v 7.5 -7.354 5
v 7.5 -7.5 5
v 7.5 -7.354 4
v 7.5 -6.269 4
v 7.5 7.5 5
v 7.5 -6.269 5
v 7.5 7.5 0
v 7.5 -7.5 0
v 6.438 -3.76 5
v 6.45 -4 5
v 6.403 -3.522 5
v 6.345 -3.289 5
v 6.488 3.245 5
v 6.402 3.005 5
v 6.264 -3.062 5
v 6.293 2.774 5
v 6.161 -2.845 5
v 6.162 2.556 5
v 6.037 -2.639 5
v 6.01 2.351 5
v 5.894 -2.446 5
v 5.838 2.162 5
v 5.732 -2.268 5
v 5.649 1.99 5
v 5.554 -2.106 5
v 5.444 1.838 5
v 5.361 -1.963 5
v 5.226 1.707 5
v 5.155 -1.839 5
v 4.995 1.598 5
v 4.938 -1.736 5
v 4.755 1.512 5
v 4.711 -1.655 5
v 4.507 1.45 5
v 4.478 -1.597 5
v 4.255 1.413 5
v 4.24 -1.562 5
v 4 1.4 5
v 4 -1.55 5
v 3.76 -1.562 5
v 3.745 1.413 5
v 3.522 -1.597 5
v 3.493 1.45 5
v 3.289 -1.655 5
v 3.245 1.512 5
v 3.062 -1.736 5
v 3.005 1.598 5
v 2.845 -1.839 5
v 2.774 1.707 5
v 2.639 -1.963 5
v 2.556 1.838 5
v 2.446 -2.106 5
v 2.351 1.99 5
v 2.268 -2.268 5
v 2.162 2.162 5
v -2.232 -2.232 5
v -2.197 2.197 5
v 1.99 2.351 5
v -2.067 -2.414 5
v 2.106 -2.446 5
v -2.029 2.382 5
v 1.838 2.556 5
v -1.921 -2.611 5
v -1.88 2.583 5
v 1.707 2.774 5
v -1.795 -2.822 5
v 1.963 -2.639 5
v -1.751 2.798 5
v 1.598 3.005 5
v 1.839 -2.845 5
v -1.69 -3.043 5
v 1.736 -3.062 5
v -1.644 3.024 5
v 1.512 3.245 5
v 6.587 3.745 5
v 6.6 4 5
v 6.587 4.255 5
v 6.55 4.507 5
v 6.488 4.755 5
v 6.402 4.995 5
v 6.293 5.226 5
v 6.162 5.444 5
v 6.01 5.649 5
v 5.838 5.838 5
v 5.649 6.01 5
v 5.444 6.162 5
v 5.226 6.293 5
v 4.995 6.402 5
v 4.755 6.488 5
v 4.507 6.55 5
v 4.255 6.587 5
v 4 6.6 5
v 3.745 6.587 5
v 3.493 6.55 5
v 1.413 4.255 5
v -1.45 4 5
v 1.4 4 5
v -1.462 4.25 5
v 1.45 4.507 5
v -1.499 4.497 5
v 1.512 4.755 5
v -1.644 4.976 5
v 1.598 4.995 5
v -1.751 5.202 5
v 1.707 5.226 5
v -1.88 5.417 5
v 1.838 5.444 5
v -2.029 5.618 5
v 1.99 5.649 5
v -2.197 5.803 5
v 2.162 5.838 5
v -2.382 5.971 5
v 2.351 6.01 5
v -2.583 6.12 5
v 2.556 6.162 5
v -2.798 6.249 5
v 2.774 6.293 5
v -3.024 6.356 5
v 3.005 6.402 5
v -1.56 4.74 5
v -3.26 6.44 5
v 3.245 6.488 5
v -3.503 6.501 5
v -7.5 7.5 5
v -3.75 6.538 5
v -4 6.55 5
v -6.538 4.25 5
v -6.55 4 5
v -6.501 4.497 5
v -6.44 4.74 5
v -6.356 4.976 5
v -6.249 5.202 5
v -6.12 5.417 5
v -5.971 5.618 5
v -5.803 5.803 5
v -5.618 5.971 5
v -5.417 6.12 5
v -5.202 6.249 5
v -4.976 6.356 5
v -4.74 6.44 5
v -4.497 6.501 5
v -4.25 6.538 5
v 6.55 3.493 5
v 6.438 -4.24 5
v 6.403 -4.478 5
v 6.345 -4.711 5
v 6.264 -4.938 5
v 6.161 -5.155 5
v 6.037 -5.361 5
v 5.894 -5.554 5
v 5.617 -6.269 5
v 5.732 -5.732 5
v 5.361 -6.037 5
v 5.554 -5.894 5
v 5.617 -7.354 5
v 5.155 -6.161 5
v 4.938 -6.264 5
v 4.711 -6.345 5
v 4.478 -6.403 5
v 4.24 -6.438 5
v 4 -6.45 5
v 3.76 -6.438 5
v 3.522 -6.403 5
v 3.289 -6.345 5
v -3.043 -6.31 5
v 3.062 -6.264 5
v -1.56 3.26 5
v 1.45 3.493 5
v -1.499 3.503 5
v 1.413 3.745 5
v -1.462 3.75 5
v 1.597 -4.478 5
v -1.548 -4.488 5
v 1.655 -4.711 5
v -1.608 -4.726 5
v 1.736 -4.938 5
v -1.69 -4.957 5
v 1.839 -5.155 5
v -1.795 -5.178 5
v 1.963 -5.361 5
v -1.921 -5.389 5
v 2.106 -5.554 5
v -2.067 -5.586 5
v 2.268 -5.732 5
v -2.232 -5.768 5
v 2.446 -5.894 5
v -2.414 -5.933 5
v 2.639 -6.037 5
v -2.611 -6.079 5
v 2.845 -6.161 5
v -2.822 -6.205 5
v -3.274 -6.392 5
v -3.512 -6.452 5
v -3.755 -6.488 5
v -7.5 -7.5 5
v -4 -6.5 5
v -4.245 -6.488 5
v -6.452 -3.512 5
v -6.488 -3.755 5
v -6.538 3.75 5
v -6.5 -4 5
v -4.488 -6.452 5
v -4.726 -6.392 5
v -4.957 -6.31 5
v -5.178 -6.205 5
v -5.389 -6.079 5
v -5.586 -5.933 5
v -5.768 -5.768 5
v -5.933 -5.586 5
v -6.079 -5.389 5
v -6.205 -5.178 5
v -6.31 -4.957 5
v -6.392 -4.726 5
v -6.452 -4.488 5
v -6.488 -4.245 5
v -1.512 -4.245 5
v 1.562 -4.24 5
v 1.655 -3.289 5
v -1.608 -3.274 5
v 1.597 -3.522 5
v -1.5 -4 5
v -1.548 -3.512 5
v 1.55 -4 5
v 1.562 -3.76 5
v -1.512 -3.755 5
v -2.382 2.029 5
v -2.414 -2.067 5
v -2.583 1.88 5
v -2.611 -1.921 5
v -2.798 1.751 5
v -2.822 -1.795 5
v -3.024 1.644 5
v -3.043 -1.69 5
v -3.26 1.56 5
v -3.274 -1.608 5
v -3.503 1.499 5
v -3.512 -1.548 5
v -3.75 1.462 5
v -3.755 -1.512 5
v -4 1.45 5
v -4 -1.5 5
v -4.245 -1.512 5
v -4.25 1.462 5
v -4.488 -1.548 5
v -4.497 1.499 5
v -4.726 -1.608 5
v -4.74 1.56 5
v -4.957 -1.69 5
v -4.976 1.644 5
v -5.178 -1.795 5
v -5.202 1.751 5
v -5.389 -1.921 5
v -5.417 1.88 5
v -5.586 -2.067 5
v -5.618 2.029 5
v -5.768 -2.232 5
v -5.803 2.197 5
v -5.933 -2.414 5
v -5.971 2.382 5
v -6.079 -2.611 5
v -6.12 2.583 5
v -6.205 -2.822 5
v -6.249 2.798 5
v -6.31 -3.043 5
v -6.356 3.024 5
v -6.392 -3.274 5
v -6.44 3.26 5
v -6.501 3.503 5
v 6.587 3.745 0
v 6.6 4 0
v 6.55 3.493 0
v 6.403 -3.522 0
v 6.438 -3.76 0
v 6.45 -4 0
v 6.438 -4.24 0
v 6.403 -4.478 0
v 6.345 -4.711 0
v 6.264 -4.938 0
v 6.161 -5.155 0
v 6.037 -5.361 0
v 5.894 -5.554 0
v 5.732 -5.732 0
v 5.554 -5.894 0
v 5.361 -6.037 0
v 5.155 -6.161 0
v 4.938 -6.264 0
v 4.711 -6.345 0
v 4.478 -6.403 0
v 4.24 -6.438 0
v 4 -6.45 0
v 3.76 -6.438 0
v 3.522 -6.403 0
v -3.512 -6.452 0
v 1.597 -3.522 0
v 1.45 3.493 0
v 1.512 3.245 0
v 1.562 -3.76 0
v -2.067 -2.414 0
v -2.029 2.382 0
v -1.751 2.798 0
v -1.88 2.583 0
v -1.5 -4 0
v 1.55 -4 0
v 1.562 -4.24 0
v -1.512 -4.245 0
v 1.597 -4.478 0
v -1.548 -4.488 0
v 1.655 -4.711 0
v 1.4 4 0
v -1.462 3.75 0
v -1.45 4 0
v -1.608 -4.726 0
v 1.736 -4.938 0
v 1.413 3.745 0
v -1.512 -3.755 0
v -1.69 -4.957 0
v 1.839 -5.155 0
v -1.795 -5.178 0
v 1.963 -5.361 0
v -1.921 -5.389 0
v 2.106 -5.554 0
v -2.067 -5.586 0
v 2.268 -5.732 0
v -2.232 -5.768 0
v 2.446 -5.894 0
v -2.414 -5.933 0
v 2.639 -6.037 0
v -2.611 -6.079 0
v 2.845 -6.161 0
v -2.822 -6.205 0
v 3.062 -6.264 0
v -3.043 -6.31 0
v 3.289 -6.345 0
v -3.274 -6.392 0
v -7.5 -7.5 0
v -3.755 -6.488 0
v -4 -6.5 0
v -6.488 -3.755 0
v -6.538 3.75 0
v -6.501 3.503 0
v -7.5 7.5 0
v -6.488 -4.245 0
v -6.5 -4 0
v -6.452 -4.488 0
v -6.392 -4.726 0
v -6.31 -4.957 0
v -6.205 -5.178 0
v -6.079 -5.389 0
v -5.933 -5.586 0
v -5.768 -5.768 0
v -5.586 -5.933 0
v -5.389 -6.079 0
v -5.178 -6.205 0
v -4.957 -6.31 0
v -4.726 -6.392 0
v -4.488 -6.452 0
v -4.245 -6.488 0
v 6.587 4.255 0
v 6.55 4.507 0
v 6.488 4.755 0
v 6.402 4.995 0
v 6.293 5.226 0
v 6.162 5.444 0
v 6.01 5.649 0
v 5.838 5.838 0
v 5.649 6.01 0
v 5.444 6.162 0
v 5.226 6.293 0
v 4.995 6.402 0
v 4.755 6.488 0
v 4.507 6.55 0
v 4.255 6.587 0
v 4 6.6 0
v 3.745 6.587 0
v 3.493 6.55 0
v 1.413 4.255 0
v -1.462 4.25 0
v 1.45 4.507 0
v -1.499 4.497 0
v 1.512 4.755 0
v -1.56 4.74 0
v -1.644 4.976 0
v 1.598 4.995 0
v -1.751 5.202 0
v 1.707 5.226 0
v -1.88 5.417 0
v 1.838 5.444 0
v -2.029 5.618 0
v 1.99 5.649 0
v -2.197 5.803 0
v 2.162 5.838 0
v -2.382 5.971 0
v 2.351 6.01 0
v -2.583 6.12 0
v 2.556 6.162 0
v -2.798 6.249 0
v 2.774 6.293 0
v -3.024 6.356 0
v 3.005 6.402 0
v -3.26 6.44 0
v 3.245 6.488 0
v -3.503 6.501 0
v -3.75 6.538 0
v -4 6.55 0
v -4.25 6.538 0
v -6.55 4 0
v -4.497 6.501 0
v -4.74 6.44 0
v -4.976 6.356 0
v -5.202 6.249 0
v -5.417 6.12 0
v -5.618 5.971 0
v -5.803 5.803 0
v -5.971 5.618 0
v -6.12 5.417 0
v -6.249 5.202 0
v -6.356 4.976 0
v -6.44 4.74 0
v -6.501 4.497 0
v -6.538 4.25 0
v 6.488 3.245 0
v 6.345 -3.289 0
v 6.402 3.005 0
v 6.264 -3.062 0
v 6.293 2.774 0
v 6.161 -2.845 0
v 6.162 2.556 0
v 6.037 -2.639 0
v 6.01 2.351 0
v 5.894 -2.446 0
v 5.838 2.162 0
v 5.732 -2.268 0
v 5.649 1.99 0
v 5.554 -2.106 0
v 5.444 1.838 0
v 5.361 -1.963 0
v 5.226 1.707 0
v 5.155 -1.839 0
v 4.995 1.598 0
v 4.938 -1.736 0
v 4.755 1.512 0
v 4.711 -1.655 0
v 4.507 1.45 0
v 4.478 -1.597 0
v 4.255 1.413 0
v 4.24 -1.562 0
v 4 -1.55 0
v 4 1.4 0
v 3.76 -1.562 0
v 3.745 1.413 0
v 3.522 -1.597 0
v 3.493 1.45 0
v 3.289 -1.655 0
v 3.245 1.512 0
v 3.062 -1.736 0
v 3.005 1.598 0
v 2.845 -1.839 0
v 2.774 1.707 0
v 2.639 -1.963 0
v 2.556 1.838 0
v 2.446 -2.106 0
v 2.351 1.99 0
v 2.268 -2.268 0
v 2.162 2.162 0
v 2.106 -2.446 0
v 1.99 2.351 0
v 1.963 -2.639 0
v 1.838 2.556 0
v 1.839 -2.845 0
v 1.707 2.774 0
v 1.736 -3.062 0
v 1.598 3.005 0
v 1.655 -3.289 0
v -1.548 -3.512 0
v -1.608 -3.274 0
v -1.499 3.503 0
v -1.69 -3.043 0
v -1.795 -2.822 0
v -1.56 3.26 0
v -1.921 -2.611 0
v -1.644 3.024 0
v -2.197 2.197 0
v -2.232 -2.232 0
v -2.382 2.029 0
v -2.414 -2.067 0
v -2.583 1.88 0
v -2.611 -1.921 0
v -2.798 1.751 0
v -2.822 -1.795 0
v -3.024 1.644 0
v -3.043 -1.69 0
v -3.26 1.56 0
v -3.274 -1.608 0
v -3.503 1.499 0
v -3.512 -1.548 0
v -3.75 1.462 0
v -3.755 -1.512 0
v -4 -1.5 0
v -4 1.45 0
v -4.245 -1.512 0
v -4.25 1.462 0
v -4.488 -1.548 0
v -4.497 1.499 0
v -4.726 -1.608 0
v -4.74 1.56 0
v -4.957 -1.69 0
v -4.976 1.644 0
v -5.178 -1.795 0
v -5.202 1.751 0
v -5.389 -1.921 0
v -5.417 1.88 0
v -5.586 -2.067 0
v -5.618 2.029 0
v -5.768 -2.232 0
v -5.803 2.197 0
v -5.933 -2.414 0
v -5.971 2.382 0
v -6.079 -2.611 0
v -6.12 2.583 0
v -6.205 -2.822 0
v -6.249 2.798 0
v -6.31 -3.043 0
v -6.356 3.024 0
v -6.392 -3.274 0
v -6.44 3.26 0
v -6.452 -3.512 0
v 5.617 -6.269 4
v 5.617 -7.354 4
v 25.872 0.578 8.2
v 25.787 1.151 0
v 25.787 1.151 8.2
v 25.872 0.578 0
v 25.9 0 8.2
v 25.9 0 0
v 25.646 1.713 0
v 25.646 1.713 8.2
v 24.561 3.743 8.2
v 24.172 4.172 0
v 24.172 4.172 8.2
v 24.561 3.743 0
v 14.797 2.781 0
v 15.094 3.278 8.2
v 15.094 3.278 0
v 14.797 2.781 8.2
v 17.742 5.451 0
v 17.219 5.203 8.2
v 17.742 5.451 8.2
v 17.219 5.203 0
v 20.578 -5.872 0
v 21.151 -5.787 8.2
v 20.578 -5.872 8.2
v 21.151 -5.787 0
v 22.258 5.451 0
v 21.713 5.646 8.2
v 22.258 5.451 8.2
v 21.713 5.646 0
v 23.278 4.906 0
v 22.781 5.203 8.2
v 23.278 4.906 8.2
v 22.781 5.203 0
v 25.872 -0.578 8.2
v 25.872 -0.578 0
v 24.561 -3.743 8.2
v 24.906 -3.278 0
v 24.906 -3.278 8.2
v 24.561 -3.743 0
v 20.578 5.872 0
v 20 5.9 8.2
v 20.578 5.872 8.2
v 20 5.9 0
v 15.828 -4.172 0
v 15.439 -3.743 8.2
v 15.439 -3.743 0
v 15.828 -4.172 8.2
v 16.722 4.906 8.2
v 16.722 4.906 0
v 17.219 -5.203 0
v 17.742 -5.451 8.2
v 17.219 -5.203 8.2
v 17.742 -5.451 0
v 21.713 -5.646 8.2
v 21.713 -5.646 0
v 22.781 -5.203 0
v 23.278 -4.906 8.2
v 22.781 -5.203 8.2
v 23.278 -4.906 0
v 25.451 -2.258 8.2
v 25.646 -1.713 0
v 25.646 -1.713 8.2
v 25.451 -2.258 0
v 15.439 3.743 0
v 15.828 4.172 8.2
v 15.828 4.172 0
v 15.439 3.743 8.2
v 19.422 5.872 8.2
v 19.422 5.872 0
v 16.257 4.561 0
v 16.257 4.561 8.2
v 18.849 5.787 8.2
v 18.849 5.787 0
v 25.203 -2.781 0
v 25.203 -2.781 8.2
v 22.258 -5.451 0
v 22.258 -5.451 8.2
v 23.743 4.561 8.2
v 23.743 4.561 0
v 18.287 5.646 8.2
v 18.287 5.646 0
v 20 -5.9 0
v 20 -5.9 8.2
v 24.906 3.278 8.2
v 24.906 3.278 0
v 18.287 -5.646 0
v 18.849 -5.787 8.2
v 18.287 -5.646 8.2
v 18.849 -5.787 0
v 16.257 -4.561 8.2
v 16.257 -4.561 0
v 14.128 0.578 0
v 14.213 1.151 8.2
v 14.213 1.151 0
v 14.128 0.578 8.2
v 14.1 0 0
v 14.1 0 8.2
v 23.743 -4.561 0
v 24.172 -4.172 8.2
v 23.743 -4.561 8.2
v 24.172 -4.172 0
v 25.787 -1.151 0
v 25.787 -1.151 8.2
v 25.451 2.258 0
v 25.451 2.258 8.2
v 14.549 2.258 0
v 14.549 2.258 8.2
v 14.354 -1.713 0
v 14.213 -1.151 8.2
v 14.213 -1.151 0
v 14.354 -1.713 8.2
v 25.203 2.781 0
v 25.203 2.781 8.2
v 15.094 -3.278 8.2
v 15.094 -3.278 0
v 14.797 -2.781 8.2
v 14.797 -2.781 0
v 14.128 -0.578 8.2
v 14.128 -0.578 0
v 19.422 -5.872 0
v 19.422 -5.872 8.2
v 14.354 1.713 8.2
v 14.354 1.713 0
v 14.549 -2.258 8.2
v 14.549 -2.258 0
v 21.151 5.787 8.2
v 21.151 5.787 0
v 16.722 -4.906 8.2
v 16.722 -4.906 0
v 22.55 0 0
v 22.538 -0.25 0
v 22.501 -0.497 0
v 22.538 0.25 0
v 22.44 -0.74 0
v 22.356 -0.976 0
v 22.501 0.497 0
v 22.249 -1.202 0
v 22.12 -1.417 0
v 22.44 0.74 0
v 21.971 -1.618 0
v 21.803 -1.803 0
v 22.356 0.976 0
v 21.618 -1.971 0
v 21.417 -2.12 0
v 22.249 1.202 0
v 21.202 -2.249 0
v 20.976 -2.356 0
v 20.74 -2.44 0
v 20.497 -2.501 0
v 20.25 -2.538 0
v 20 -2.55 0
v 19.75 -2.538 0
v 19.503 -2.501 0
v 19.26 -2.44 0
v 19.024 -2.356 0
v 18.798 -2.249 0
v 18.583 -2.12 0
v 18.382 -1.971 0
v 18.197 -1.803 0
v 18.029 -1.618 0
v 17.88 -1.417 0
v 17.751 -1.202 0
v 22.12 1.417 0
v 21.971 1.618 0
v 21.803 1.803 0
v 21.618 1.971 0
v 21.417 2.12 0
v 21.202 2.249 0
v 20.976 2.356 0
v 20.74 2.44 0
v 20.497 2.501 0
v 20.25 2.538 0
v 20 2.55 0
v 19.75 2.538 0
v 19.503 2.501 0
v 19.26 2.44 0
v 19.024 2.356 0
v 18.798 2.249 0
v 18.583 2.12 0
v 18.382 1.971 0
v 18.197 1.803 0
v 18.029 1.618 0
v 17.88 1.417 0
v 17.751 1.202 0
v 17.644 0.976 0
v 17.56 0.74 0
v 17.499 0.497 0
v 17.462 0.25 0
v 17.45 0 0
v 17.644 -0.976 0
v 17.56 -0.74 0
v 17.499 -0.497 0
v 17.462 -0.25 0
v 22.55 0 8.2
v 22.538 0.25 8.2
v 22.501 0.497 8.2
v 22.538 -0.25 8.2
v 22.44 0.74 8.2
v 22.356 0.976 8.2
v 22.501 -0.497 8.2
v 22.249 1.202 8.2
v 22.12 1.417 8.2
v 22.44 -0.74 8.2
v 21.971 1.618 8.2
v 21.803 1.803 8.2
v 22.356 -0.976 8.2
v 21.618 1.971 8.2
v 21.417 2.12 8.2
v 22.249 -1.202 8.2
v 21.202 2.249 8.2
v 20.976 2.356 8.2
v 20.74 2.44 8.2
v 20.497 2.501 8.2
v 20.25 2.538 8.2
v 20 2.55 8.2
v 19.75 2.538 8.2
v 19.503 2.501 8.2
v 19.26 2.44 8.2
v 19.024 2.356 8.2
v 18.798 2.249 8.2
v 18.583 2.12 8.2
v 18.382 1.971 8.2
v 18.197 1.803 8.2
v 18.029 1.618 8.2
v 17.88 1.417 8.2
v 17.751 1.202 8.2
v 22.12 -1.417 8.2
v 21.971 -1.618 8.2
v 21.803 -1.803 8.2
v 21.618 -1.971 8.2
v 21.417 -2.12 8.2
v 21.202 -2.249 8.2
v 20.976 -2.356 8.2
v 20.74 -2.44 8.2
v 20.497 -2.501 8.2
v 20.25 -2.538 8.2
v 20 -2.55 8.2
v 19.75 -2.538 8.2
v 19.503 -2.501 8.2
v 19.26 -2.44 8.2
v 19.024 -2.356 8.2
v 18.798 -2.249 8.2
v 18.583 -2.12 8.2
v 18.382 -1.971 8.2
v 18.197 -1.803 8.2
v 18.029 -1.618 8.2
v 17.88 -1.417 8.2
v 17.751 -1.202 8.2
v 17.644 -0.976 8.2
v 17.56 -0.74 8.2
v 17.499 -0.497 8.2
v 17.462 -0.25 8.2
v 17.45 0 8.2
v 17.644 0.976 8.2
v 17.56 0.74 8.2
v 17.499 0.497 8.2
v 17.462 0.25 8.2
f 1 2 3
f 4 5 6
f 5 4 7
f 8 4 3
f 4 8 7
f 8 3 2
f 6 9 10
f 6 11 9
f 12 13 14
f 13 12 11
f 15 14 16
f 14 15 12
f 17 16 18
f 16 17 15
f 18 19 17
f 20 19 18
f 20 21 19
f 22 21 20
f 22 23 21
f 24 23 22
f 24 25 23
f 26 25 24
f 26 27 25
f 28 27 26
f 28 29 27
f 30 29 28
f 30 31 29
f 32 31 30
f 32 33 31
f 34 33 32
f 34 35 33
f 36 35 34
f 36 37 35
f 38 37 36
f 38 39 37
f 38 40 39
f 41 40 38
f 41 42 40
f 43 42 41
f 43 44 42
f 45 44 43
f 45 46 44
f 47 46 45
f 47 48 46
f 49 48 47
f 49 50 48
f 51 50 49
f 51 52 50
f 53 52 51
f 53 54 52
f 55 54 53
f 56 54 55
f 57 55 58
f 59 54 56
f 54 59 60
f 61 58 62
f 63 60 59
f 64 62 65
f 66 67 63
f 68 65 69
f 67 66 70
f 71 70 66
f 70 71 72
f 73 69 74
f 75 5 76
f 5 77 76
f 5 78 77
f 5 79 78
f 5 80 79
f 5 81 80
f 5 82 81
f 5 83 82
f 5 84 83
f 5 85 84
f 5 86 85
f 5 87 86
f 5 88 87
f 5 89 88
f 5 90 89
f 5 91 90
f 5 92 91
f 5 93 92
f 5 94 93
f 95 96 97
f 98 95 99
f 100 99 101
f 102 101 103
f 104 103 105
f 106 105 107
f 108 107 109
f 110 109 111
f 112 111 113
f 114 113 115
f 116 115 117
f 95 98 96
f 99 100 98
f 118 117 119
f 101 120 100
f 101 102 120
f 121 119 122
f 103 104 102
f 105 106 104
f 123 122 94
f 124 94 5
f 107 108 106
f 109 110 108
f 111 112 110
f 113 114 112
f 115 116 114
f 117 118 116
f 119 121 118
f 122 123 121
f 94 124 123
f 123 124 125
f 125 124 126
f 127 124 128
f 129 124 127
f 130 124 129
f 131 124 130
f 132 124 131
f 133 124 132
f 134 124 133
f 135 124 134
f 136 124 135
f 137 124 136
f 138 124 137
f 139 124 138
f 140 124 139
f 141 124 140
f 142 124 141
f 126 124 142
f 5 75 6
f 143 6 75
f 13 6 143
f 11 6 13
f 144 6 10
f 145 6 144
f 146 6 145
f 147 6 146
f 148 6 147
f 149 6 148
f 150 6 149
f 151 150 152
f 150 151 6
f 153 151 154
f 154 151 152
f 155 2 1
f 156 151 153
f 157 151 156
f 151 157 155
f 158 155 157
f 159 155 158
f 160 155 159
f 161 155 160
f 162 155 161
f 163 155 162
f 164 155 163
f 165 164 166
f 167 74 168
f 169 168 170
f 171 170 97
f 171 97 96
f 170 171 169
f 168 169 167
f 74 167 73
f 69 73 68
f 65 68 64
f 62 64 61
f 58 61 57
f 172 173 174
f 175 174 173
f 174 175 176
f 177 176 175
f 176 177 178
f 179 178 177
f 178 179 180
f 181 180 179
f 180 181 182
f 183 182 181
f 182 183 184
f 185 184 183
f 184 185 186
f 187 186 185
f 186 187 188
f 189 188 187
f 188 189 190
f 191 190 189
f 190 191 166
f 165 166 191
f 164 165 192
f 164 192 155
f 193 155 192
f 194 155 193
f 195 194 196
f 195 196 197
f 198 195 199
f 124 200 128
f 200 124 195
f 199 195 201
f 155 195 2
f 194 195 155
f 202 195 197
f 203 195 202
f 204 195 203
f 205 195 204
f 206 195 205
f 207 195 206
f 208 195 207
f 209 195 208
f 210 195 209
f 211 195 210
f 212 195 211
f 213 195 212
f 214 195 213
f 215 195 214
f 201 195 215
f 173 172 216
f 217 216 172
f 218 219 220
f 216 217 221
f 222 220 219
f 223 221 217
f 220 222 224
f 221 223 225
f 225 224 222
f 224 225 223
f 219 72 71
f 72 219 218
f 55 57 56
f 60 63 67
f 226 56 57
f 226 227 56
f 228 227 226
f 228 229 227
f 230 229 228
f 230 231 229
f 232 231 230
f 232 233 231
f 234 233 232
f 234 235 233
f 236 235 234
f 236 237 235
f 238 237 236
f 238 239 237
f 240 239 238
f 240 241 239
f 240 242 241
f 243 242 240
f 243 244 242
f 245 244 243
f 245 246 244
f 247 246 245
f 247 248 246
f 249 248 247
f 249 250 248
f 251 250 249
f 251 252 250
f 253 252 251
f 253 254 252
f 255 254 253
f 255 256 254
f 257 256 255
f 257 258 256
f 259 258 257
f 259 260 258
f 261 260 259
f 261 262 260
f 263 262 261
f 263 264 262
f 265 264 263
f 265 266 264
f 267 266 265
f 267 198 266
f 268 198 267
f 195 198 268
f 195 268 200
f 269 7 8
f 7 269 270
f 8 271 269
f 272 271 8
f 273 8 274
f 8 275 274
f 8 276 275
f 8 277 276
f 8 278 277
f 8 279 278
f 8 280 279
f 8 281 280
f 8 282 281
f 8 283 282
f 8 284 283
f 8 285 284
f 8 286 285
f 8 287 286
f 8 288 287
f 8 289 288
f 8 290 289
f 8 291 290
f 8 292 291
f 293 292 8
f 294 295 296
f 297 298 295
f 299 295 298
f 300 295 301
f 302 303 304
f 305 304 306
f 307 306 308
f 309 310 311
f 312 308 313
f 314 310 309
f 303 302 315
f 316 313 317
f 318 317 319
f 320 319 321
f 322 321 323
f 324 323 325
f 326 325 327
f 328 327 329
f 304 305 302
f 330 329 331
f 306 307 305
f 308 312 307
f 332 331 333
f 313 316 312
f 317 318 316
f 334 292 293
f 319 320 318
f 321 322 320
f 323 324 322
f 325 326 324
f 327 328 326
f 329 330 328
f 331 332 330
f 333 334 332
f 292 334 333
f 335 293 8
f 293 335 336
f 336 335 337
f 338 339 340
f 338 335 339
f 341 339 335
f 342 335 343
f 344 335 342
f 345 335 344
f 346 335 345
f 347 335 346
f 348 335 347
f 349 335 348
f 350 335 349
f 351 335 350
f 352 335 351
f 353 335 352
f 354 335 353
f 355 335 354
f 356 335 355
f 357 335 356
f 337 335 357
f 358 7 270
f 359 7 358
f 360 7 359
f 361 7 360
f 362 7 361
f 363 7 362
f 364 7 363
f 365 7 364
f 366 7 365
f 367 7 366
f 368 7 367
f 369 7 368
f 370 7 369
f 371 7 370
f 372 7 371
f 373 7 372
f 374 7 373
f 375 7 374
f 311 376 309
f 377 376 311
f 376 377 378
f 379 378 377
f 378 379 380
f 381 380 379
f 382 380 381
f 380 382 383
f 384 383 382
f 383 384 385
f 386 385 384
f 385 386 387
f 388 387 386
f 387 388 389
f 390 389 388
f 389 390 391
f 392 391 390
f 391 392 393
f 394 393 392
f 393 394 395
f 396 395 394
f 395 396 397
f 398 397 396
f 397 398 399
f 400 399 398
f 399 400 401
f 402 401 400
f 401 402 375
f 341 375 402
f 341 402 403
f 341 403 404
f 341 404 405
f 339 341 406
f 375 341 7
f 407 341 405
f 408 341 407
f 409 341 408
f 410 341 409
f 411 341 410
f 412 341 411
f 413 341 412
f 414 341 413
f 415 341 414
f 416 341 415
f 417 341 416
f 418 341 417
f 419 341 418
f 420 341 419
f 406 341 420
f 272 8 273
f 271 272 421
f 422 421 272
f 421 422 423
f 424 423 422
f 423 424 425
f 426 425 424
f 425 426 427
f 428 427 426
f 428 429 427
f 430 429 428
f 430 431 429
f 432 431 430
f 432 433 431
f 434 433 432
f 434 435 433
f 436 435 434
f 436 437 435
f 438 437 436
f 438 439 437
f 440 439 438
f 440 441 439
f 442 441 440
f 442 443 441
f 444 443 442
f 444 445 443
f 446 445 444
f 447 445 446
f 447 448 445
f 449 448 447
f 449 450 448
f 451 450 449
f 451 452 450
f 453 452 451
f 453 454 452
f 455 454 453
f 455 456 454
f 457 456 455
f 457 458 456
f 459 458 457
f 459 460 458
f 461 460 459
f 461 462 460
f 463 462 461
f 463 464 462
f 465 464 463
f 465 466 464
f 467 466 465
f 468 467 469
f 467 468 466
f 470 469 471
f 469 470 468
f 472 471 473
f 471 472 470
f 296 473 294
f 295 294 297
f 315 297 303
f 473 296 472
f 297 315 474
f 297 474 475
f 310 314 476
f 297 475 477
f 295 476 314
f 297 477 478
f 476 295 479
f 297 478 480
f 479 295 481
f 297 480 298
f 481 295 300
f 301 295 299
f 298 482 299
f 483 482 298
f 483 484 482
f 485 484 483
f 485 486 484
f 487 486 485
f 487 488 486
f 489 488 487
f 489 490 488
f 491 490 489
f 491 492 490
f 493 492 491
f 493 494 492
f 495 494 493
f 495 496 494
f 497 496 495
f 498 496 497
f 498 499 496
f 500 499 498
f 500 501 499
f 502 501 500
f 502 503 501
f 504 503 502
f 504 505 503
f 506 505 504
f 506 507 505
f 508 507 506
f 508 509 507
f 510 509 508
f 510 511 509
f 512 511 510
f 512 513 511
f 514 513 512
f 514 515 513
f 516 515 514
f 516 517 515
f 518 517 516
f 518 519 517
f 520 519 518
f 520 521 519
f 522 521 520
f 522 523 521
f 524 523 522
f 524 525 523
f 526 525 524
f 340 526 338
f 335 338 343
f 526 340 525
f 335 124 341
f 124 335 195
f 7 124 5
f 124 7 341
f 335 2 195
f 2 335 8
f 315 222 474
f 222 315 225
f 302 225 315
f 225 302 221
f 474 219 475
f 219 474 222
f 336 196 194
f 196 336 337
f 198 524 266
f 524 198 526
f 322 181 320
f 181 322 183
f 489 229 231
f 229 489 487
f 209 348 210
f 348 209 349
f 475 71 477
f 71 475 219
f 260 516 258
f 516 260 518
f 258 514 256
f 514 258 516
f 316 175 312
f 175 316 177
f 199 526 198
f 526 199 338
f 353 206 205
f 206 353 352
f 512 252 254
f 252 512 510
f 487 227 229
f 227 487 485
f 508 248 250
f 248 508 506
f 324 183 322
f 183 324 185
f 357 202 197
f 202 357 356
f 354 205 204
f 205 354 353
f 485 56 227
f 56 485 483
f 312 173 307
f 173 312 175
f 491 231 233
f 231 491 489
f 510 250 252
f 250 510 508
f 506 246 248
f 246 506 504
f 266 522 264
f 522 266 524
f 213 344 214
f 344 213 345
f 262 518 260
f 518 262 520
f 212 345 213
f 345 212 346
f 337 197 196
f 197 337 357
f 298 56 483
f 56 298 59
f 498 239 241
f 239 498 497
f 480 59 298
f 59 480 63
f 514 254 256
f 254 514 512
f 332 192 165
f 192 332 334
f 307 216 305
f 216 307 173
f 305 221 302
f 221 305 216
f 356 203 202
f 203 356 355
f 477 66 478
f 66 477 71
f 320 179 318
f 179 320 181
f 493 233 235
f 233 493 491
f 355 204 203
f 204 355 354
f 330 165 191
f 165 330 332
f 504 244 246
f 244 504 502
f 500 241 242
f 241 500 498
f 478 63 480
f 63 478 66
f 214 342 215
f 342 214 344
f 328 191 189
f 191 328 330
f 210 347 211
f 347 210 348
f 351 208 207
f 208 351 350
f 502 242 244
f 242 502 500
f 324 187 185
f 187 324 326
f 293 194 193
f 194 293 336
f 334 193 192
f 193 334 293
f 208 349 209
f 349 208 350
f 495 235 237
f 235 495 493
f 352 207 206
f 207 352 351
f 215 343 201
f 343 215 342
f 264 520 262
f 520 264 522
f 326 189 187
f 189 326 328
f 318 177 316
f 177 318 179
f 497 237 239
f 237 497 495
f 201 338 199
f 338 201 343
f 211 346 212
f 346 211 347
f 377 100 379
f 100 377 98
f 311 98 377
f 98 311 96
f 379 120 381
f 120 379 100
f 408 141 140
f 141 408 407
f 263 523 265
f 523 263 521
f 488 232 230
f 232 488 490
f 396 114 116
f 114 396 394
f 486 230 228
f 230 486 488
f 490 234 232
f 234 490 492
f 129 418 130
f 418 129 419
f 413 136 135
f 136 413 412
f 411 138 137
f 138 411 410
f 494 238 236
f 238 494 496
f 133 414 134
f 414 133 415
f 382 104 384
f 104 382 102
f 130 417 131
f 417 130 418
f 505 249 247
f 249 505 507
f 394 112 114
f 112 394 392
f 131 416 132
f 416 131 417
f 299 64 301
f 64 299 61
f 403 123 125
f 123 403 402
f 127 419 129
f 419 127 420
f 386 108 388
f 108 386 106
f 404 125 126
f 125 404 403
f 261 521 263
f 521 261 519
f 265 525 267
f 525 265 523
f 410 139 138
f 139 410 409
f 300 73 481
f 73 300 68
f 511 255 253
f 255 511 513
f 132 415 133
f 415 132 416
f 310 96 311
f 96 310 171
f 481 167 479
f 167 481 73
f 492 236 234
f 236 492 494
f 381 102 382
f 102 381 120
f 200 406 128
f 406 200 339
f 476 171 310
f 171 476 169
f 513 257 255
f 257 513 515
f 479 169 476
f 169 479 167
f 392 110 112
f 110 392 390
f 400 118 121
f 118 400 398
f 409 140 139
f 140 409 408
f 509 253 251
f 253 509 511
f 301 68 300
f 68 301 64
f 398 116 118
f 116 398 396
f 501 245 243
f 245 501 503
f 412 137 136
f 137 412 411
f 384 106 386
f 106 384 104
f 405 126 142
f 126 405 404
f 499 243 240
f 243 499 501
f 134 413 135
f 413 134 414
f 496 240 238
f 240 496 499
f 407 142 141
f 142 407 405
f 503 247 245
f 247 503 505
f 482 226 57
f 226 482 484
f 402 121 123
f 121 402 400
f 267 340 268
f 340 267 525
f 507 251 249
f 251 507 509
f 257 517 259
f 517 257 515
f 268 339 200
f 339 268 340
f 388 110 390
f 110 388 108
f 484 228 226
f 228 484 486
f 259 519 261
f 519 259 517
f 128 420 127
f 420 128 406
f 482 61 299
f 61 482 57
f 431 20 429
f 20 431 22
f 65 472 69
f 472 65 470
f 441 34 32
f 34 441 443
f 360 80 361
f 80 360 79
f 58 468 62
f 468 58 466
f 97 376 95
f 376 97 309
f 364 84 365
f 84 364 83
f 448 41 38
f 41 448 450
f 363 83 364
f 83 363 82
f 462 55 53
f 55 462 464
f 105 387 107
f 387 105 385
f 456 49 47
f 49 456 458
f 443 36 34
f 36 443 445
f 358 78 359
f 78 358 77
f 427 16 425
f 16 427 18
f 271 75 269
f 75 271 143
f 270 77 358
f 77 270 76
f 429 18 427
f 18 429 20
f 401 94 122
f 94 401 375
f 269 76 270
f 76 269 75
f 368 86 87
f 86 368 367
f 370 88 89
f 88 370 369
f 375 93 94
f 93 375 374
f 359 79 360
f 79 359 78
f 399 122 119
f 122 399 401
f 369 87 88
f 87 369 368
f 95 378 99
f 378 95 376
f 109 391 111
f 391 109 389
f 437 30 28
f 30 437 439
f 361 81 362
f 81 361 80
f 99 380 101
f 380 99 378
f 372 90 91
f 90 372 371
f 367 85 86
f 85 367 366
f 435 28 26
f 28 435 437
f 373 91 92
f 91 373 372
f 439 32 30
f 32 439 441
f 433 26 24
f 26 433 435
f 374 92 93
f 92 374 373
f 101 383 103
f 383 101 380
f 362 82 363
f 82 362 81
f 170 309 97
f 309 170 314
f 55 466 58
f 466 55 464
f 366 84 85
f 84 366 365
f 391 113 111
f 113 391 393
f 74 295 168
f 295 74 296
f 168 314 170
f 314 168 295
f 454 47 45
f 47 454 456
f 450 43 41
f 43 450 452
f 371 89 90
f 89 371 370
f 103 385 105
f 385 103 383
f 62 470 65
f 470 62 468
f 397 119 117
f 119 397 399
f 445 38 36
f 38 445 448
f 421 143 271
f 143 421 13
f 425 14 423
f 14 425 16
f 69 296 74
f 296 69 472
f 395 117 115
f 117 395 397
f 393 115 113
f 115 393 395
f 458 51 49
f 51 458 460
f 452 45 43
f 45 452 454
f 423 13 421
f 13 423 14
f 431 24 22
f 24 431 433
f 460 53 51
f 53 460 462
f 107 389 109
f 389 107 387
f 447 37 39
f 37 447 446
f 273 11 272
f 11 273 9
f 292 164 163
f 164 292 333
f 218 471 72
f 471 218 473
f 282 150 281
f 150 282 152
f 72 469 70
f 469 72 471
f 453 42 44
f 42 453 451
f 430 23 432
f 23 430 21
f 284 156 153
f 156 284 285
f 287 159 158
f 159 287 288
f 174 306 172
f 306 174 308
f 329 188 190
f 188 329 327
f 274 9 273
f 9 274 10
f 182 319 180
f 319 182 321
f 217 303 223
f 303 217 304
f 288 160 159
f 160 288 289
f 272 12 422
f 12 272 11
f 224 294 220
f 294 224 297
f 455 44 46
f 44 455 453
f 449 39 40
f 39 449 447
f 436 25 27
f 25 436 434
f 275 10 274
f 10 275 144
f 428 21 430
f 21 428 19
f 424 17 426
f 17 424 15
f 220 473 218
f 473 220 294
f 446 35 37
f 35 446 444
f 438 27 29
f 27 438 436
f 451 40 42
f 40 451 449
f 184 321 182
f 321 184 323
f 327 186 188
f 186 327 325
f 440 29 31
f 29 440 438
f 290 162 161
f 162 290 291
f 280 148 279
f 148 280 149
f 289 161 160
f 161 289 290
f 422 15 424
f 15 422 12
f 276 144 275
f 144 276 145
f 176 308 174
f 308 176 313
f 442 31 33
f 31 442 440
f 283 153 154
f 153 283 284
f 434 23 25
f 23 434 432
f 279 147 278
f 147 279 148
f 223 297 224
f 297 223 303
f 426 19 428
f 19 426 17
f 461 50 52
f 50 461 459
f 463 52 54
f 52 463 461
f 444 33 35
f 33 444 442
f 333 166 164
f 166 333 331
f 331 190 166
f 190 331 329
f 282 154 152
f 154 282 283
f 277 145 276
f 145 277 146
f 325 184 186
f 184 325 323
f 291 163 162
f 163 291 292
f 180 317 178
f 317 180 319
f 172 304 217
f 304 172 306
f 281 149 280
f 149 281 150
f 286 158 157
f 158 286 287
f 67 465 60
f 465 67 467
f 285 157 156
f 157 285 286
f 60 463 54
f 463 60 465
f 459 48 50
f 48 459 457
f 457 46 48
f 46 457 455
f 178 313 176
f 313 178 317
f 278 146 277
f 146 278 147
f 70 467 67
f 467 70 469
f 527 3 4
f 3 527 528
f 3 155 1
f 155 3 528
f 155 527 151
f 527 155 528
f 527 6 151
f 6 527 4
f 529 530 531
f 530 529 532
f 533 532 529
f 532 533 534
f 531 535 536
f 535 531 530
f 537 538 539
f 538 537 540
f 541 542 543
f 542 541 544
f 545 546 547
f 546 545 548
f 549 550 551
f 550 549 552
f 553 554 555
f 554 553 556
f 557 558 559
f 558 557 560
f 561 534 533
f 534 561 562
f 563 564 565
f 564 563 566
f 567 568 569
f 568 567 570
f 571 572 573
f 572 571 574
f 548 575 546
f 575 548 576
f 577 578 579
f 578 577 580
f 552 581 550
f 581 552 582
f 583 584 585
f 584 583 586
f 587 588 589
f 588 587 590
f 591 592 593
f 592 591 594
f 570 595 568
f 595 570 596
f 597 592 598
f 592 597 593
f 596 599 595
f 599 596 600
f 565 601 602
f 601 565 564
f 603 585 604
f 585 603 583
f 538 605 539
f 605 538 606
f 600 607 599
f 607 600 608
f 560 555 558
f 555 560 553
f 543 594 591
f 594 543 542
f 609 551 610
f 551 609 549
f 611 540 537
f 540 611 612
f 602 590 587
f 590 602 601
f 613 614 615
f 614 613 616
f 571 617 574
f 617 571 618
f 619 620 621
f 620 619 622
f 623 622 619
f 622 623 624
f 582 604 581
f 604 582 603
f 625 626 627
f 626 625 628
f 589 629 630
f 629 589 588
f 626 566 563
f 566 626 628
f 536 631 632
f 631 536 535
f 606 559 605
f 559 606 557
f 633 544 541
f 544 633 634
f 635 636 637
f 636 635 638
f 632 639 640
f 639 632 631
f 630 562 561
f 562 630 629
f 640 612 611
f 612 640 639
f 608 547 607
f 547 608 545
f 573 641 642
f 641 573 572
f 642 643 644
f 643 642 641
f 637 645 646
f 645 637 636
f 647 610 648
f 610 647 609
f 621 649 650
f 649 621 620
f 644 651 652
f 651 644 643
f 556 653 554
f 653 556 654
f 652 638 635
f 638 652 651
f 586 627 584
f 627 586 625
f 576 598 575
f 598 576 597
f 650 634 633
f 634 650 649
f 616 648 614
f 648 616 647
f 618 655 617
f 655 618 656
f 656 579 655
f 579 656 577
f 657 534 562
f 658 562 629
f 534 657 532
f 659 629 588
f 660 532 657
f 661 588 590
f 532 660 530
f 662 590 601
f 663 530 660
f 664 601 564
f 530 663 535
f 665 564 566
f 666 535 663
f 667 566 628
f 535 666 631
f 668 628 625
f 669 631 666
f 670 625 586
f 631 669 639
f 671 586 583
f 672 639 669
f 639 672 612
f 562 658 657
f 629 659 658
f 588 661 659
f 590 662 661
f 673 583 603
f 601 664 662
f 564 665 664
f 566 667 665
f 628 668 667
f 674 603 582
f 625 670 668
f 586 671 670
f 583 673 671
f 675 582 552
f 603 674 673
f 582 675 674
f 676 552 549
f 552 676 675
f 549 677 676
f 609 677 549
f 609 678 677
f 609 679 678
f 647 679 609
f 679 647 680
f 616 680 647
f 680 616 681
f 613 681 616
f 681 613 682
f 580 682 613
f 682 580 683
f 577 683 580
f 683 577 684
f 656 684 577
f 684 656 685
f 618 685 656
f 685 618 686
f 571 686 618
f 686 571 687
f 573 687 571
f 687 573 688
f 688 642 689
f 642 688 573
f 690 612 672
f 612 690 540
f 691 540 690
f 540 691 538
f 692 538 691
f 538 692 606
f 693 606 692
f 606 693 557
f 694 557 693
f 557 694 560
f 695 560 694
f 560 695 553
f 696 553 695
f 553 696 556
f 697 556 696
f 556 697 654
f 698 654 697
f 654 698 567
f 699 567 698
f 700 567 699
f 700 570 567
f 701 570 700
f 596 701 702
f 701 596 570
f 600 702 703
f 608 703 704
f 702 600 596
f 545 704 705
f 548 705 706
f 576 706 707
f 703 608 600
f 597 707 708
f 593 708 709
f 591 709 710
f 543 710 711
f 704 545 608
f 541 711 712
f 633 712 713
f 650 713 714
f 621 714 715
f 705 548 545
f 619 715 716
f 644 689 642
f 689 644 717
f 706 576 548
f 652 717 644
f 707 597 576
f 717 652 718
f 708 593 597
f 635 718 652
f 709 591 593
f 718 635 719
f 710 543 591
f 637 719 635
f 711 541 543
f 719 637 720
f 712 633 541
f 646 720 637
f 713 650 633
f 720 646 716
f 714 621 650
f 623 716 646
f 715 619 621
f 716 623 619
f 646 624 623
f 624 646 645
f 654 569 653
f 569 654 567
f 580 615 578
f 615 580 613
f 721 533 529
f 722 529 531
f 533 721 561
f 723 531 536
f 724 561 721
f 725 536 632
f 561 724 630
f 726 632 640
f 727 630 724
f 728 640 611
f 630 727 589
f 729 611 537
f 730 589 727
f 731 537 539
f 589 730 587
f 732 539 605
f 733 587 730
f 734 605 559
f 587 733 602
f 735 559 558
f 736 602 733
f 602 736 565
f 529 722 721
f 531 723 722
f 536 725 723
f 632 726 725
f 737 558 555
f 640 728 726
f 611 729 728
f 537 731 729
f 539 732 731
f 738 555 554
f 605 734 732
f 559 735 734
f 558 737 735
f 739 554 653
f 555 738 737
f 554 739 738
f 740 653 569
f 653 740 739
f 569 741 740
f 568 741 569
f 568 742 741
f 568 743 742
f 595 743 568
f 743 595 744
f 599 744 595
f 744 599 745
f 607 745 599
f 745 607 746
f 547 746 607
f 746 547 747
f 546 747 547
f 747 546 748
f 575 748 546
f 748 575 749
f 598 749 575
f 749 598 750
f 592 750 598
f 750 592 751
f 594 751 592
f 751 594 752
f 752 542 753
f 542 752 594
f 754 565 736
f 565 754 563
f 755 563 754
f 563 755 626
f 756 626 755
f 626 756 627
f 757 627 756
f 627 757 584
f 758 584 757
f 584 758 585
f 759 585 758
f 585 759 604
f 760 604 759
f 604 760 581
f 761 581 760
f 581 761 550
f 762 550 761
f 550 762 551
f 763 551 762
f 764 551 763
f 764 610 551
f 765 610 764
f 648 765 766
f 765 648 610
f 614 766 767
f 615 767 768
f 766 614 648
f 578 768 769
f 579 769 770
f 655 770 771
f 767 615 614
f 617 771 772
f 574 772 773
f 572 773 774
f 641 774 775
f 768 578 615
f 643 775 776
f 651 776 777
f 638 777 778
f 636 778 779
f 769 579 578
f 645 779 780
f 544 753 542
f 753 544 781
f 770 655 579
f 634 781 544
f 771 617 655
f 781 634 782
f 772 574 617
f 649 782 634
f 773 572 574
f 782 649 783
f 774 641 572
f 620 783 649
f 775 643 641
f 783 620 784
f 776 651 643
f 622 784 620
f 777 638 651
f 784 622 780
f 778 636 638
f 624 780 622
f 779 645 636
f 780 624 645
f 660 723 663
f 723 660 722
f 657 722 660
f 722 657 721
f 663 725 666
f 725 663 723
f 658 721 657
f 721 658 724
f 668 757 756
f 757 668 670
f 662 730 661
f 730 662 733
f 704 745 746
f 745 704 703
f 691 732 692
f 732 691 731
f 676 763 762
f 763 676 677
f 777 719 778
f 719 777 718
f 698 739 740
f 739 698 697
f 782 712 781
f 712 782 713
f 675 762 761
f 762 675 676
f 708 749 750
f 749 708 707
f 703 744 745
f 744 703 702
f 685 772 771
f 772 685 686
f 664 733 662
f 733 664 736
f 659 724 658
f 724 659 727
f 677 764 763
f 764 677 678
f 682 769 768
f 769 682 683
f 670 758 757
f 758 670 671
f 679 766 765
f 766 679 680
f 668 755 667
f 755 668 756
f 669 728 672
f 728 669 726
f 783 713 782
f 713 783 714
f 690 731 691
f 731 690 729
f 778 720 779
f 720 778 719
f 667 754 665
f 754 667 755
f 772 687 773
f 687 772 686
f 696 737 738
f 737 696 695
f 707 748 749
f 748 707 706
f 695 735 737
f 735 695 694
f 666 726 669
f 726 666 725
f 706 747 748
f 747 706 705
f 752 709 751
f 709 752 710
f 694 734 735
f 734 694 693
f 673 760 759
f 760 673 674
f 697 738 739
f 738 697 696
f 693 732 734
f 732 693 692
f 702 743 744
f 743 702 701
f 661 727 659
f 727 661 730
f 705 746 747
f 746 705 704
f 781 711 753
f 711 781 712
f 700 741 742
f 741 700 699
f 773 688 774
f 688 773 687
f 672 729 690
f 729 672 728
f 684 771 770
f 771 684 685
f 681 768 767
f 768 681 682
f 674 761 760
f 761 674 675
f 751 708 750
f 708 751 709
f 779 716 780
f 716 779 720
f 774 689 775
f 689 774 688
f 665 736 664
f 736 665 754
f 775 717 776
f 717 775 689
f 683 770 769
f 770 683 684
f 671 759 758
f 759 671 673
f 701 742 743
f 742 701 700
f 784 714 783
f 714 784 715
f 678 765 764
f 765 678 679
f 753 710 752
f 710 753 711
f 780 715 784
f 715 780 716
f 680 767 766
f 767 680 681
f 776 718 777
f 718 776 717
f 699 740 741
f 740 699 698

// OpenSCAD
sizeTest = true;

$fn = 64;

module hexagon(r) {
    translate([0, 0, -5])
    linear_extrude(10)
    polygon([for (i = [0 : 6]) r * [cos(i * 60), sin(i * 60)]]);
}

module Hole(d) {
    difference() {
        scale(10/14)
        import("corejo/helice-toroidale/helice_18.stl");

        translate([0, 0, 4])
        cylinder(12, d=11.8, center=true);
    }
    
    difference() {
        cylinder(8.2, d=11.8);

        cylinder(8.2, d=d);
    }
}

if (sizeTest) {
    difference() {
        translate([0, 0, 2.5])
        cube([15, 15, 5], true);
        
        translate([-4, -4, 0])
        cylinder(8.2, d=5);

        translate([-4,  4, 0])
        cylinder(8.2, d=5.1);

        translate([ 4,  4, 0])
        cylinder(8.2, d=5.2);
        
        translate([ 4, -4, 0])
        cylinder(8.2, d=4.9);
        
        translate([5, -10.5, 4])
        linear_extrude(2)
        text("-");
    }
    
    translate([20, 0, 0])
    difference() {
        cylinder(8.2, d=11.8);
        cylinder(8.2, d=5.1);
    }
} else {
    *Hole(5.2);
    
    //translate([30, 0, 0])
    difference() {
        union() {
            translate([-75, 0, 0])
            cube([150, 10, 10], true);
            
            cube([20, 20, 10], true);
        }
        #hexagon(7.9 / (2 * cos(30)) + 0.2);
    }
}
